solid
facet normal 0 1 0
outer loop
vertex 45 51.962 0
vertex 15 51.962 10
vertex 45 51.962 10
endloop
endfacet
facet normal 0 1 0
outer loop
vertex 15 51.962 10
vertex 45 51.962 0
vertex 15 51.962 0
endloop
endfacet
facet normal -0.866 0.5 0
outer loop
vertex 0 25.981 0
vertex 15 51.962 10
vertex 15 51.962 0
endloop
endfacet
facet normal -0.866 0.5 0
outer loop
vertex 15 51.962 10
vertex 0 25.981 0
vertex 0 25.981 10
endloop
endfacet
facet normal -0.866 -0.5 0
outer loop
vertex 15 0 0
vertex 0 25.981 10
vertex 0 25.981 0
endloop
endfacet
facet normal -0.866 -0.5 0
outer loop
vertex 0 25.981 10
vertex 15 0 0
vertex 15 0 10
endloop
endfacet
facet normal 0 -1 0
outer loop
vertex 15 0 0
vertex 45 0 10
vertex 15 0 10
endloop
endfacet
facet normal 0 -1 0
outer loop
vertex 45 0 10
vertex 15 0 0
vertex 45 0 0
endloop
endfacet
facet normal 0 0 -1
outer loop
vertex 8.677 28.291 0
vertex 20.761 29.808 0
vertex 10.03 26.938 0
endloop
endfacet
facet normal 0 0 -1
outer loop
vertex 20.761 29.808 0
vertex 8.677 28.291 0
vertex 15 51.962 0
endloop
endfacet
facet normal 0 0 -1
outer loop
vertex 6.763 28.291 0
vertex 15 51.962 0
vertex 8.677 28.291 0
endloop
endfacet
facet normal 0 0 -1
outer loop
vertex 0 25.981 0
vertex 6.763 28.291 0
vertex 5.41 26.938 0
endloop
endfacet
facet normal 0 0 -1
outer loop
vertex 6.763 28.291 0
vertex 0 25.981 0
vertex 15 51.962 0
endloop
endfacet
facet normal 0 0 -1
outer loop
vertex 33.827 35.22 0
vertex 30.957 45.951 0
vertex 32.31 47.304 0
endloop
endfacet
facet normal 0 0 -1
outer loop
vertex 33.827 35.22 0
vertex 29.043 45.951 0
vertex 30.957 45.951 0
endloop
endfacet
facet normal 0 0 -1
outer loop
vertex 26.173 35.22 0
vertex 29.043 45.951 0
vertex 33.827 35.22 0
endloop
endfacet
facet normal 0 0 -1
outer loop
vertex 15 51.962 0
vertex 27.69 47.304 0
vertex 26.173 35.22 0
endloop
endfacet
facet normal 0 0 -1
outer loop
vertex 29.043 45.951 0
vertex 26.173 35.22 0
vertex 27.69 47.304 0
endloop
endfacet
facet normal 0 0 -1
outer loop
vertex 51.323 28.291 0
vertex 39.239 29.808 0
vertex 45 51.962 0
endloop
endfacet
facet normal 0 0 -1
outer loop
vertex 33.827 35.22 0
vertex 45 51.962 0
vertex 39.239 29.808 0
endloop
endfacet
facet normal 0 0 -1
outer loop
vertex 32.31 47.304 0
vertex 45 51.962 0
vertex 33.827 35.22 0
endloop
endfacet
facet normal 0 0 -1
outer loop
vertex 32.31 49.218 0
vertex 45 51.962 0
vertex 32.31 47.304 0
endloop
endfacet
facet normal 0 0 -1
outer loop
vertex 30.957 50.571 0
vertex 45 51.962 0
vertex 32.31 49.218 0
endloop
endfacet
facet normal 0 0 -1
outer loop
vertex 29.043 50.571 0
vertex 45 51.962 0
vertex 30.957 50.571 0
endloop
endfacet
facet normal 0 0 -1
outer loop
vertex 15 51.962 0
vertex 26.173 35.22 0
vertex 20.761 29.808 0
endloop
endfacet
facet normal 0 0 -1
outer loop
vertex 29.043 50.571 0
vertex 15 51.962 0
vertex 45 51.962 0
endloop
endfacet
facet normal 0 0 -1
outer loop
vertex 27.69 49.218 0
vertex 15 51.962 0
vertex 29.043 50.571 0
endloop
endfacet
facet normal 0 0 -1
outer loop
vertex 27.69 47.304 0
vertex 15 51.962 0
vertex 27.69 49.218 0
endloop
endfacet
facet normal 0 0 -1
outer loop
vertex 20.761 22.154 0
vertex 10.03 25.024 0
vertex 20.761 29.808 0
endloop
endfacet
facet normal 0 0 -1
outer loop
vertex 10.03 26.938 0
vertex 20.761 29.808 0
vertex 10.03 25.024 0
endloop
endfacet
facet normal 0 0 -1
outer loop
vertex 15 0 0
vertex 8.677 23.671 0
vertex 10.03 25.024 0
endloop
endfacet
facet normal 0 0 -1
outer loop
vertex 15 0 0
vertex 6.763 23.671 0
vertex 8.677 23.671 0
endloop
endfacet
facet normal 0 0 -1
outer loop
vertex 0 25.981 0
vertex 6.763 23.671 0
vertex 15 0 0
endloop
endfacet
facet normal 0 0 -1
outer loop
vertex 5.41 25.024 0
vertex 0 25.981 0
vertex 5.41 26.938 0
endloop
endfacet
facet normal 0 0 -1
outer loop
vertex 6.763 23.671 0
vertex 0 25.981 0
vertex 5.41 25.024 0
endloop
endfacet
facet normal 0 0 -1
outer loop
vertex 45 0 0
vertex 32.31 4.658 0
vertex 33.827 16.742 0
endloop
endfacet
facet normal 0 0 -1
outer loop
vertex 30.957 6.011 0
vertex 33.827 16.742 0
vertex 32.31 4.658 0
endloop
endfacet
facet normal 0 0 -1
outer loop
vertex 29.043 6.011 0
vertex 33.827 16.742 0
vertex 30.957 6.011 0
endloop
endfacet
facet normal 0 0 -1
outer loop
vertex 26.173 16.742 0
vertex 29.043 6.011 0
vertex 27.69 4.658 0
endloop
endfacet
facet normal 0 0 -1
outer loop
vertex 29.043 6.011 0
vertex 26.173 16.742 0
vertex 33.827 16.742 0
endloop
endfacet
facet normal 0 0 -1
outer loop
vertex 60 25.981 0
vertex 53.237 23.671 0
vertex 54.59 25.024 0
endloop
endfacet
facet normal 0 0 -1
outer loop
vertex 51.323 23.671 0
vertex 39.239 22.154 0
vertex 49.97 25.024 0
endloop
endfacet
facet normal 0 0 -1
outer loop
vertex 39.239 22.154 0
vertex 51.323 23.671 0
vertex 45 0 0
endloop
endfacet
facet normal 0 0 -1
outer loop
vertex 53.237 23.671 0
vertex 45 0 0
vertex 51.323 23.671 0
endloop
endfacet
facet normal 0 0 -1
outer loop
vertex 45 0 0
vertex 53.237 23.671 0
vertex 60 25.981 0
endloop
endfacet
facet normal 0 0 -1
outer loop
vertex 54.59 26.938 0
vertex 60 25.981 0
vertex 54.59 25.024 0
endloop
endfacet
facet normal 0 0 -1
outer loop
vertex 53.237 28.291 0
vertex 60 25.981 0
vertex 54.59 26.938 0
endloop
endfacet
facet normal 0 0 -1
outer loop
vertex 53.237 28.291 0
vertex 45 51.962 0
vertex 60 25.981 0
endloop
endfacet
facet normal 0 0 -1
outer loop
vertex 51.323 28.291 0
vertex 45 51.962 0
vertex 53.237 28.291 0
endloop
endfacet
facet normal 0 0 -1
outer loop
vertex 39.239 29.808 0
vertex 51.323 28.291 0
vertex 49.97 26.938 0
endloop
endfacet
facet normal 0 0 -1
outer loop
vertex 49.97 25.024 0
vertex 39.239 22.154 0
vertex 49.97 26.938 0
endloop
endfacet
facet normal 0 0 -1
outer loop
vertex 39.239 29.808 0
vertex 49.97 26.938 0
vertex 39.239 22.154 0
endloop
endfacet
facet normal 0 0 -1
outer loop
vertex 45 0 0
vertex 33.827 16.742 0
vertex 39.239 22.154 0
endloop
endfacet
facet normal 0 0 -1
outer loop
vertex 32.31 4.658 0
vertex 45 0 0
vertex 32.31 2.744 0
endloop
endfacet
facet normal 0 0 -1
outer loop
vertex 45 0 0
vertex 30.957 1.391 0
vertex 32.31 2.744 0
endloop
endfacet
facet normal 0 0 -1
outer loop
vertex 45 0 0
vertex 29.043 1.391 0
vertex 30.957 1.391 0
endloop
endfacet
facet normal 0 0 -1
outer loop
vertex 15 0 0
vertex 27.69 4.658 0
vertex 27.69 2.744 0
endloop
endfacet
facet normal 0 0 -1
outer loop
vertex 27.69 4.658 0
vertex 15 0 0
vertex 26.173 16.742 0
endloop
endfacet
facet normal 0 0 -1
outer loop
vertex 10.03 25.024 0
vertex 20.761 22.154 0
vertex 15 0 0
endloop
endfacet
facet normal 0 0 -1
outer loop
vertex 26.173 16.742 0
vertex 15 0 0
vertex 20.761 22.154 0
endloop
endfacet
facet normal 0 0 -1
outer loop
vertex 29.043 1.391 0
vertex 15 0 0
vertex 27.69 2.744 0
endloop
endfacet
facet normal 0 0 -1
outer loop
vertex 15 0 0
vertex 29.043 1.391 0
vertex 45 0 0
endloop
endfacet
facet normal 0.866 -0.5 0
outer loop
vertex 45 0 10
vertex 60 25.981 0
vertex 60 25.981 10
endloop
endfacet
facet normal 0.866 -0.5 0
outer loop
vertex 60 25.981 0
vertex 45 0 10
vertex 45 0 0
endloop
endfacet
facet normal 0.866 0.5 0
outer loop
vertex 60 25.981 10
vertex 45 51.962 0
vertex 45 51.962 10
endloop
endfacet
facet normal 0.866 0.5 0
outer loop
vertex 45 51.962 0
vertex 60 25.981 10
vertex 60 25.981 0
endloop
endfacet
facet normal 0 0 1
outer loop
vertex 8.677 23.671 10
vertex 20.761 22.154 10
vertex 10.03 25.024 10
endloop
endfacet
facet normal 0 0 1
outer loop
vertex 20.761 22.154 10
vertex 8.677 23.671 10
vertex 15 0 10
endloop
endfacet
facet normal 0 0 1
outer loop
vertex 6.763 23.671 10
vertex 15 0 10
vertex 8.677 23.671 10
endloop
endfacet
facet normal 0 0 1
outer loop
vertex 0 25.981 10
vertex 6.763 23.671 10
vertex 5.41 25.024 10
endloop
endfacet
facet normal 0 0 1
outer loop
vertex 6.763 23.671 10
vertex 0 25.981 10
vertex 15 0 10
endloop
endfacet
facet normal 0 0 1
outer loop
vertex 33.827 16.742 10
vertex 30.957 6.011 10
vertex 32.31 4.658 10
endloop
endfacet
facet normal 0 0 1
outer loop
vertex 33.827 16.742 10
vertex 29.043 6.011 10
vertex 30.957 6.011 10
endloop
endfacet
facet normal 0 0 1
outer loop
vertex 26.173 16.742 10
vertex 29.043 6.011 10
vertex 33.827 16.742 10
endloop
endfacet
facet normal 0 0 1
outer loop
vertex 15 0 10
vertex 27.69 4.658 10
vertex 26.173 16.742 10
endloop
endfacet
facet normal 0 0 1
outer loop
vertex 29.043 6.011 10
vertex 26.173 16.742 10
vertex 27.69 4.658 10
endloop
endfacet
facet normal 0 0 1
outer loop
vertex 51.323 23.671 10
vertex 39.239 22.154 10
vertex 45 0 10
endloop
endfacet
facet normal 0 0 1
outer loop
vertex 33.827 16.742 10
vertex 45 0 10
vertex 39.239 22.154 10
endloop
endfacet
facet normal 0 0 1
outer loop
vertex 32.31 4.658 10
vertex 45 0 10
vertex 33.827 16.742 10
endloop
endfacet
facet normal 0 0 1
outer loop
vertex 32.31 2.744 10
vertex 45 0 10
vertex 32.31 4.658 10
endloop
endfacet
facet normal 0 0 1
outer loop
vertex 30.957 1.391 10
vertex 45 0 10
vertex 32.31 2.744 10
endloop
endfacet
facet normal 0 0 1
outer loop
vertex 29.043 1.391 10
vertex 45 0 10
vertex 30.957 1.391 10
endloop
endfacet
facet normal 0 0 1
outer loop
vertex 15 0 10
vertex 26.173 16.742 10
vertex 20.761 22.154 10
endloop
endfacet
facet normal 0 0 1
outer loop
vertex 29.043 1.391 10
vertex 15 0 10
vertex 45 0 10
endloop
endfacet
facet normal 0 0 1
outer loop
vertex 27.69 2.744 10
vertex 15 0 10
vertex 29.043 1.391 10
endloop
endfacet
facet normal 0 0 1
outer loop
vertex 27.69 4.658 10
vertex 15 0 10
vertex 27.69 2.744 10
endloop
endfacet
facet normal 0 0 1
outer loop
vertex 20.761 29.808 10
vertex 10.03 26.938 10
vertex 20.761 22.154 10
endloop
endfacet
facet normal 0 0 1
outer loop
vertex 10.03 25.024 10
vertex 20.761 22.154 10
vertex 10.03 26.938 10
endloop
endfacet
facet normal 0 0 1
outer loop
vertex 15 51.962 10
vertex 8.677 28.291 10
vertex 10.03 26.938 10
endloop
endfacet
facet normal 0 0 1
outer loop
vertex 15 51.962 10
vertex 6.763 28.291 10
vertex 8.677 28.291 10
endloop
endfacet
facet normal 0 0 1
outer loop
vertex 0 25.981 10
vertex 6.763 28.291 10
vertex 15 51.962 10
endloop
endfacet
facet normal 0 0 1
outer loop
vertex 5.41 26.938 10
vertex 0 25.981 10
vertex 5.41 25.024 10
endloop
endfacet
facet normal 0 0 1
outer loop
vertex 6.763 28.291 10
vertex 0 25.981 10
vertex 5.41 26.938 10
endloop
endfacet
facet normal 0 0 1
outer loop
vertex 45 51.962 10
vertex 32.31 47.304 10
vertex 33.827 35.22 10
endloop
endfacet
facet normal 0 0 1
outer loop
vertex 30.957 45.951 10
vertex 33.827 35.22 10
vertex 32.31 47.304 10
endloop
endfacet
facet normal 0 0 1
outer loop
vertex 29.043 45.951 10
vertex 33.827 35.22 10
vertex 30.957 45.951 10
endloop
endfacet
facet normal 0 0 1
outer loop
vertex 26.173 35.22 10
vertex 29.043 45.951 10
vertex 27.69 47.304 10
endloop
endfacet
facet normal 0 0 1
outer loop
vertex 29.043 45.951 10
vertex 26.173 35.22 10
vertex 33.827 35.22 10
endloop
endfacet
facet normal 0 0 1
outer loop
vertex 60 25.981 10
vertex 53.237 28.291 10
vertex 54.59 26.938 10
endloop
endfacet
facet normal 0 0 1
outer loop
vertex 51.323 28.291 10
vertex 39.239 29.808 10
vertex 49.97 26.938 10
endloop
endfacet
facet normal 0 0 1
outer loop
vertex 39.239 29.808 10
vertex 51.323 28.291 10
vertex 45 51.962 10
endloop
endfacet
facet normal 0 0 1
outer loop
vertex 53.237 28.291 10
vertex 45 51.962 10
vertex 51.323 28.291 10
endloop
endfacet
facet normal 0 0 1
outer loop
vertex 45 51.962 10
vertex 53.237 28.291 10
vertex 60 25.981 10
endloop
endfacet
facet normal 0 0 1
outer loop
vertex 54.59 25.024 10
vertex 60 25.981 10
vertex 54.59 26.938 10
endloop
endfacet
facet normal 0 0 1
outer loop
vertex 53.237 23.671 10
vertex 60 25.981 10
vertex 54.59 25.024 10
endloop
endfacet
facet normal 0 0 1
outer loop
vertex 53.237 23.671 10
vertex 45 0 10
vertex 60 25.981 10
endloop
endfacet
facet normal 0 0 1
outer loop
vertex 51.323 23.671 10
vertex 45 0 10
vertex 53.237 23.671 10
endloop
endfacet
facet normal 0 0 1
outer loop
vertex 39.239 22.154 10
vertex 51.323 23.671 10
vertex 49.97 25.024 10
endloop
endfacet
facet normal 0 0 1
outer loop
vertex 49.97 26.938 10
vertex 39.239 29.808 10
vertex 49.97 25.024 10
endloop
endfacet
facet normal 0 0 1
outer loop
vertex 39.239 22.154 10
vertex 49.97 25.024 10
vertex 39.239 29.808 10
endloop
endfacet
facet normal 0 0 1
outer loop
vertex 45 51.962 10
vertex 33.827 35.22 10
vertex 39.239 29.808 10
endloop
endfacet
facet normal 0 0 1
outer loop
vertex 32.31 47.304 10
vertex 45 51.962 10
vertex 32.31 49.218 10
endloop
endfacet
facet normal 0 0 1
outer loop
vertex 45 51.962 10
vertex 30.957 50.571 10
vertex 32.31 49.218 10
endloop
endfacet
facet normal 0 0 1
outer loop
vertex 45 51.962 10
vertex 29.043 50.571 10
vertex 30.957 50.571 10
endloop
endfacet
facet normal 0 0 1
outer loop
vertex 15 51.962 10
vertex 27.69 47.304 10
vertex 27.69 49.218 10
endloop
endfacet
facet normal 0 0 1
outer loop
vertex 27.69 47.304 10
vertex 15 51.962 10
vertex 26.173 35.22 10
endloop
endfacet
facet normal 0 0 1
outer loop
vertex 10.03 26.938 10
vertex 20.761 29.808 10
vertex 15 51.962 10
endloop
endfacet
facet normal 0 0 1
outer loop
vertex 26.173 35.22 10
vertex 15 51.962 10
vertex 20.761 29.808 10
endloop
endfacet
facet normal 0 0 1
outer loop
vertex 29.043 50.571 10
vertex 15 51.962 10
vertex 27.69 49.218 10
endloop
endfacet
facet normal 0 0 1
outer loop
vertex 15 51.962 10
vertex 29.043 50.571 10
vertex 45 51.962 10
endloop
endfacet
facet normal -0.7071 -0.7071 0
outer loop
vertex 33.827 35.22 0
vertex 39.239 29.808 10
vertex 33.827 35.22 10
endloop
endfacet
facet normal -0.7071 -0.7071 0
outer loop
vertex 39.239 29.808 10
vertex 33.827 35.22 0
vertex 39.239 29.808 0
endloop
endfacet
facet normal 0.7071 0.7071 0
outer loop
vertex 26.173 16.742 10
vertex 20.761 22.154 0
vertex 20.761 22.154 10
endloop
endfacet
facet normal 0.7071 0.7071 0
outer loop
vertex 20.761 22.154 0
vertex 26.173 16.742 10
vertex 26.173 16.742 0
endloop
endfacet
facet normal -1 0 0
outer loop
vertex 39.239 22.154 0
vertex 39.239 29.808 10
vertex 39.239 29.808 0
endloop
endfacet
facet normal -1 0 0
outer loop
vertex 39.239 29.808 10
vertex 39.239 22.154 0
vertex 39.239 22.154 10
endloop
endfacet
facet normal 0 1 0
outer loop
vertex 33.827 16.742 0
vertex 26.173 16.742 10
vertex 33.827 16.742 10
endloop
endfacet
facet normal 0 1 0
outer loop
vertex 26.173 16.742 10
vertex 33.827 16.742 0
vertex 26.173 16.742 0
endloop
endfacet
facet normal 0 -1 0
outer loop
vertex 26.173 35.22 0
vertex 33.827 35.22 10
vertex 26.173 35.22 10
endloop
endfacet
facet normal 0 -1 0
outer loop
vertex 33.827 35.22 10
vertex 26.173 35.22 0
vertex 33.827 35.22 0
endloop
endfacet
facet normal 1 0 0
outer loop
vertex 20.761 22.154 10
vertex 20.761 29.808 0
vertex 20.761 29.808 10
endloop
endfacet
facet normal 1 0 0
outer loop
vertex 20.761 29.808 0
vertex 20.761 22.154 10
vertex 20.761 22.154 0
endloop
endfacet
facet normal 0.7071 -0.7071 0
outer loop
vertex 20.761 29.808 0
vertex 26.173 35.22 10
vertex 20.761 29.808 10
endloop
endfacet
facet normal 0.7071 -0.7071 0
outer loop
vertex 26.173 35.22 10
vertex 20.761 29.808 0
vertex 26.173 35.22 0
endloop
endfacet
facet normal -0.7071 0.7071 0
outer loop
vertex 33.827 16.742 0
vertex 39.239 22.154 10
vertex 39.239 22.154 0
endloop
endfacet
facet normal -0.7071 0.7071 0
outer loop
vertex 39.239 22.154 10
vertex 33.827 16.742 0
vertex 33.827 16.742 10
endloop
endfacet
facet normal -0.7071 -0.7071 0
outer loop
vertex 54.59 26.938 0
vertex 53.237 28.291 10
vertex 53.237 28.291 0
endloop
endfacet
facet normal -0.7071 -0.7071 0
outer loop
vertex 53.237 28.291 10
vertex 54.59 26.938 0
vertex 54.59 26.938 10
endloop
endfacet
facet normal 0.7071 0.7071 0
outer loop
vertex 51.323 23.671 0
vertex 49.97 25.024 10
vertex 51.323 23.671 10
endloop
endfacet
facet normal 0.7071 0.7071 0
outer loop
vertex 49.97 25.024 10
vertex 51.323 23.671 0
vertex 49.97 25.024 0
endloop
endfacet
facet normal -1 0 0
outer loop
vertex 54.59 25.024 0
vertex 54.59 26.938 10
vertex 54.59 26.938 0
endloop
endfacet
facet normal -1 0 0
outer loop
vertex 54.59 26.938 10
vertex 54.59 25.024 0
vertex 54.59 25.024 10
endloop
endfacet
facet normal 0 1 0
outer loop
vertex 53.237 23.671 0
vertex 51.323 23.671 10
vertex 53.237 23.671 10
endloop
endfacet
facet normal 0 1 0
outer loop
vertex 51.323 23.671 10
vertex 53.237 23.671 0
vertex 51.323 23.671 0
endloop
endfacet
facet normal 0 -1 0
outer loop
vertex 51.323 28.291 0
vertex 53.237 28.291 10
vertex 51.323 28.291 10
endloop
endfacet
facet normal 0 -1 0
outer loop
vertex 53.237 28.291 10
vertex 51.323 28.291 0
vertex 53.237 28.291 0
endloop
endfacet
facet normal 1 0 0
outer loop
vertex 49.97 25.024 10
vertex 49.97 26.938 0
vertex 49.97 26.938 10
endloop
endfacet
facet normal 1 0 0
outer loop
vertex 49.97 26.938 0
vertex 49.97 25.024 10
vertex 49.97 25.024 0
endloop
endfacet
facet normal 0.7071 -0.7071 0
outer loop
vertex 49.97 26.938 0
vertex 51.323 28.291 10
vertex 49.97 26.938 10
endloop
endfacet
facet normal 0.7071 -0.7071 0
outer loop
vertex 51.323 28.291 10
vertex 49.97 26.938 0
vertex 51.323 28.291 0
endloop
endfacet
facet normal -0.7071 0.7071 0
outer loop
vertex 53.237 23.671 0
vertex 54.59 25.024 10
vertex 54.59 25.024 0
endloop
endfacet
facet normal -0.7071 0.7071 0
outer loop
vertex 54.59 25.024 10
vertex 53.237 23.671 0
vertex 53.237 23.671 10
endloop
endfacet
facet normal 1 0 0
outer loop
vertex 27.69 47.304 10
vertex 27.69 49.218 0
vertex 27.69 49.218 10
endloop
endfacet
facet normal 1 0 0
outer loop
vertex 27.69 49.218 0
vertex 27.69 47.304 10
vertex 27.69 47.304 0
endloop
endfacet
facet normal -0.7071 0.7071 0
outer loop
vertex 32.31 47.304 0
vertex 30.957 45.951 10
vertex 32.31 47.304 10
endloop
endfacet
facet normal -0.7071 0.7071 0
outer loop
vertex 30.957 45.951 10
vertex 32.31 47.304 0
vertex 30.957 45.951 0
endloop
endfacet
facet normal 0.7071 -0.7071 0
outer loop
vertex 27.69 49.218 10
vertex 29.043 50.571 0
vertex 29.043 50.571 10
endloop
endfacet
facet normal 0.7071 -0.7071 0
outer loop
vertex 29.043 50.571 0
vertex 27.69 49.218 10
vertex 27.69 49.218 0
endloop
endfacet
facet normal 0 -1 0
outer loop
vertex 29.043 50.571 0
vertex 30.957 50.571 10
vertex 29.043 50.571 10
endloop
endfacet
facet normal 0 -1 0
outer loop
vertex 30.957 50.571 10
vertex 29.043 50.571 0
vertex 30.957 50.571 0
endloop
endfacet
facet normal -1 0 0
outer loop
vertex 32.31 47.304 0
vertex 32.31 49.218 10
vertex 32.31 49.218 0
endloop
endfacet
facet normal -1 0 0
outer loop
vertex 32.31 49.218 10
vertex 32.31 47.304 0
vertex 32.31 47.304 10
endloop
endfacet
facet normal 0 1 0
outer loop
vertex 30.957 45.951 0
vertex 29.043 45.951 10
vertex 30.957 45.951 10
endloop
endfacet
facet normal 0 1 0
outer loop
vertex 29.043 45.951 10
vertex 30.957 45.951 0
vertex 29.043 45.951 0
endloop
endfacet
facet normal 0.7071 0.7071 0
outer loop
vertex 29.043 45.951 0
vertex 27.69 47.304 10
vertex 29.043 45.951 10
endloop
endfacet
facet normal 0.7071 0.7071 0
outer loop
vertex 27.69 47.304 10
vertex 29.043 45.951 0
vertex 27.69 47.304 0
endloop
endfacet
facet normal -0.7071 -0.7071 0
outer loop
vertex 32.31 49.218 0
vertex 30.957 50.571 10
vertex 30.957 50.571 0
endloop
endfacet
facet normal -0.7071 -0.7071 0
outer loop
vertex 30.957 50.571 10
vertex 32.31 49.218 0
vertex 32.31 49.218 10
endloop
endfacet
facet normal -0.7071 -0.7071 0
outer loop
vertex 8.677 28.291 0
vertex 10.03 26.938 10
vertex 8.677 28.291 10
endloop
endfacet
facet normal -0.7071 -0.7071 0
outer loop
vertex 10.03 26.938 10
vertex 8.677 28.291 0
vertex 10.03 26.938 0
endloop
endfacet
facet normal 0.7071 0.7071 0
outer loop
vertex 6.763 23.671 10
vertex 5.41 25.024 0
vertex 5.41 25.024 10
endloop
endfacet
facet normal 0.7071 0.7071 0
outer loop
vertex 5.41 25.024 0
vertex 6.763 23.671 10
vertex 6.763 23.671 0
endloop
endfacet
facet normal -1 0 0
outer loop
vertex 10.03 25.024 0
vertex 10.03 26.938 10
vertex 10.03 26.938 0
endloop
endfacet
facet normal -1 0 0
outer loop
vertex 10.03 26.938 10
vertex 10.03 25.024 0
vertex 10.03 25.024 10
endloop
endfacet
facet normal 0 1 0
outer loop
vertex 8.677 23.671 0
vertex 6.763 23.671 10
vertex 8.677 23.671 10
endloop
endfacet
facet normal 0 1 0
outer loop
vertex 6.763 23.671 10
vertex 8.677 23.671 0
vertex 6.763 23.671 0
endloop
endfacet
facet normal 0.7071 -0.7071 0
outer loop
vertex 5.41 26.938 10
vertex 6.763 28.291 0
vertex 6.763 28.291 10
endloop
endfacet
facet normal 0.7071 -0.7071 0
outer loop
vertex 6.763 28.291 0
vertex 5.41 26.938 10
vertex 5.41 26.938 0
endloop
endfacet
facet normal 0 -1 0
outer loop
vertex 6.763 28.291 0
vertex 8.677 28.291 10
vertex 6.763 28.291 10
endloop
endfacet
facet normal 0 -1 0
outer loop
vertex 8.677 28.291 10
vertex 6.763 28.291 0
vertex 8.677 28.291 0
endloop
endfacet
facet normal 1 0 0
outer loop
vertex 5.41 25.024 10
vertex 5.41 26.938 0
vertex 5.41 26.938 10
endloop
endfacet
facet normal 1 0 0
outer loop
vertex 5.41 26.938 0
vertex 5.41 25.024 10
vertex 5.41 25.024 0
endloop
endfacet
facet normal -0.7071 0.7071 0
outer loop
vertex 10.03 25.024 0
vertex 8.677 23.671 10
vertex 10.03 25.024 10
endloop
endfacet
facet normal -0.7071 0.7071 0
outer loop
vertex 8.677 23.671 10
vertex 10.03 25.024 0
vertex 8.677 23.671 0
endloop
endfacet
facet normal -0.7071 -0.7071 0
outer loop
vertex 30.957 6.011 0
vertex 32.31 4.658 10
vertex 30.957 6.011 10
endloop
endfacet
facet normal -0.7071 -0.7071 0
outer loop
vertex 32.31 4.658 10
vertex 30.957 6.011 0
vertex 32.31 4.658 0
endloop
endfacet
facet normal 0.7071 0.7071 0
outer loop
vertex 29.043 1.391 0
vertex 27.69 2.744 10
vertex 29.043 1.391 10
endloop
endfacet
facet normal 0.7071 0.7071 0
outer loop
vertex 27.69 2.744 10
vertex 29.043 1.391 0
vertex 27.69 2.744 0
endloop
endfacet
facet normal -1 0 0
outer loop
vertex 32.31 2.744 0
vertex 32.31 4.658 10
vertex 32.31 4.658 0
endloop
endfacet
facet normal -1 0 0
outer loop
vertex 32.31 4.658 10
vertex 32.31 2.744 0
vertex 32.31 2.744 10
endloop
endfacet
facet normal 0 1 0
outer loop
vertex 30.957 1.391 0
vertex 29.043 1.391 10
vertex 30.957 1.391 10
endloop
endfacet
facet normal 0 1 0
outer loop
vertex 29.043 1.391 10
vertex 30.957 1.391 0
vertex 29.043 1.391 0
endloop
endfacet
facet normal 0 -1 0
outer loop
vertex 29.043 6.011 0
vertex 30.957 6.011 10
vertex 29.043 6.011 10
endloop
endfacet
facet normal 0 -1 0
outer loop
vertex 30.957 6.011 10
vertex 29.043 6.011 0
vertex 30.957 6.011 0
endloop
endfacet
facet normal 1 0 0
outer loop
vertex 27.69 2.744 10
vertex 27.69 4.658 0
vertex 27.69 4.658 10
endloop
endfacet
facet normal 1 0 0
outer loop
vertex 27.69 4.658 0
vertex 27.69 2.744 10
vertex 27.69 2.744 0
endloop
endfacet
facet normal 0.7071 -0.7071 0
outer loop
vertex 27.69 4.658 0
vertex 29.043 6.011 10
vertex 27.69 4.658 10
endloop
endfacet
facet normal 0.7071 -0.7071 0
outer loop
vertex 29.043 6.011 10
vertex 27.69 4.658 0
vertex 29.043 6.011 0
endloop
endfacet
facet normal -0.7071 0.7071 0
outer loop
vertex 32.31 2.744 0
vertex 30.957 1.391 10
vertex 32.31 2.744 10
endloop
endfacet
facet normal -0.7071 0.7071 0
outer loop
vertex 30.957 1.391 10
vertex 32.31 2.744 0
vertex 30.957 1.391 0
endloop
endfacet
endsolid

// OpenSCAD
$fn = 32;

// ----------------------------------------------------------------------
// Polygon plate: 6-gon R30, 4 bolt windows
// ----------------------------------------------------------------------

// --- parameters (mm) ---
sides = 6;                // number of polygon sides
plate_r = 30;             // circumscribed radius of the polygon
bore_r = 10;              // centre bore radius
bolts = 4;                // number of bolt windows
ring_r = 22.28;           // bolt-circle radius
bolt_r = 2.5;             // bolt window radius
plate_t = 10;             // plate thickness, Z (extrusion height)
fit_tol = 0.1;            // declared fit tolerance (prompt contract)
free_tol = 0.3;           // declared free tolerance (prompt contract)

plate_d = 2 * plate_r;  // circumscribed diameter
bore_d = 2 * bore_r;  // centre bore diameter
bolt_d = 2 * bolt_r;  // bolt window diameter
ring_d = 2 * ring_r;  // bolt-circle diameter

profile = [[60, 25.981], [45, 51.962], [15, 51.962], [0, 25.981], [15, 0], [45, 0]];  // primary outline, 6 points, counter clockwise
void_1 = [[39.239, 29.808], [33.827, 35.22], [26.173, 35.22], [20.761, 29.808], [20.761, 22.154], [26.173, 16.742], [33.827, 16.742], [39.239, 22.154]];  // centre bore, 8 points
void_2 = [[54.59, 26.938], [53.237, 28.291], [51.323, 28.291], [49.97, 26.938], [49.97, 25.024], [51.323, 23.671], [53.237, 23.671], [54.59, 25.024]];  // bolt window 1, 8 points
void_3 = [[32.31, 49.218], [30.957, 50.571], [29.043, 50.571], [27.69, 49.218], [27.69, 47.304], [29.043, 45.951], [30.957, 45.951], [32.31, 47.304]];  // bolt window 2, 8 points
void_4 = [[10.03, 26.938], [8.677, 28.291], [6.763, 28.291], [5.41, 26.938], [5.41, 25.024], [6.763, 23.671], [8.677, 23.671], [10.03, 25.024]];  // bolt window 3, 8 points
void_5 = [[32.31, 4.658], [30.957, 6.011], [29.043, 6.011], [27.69, 4.658], [27.69, 2.744], [29.043, 1.391], [30.957, 1.391], [32.31, 2.744]];  // bolt window 4, 8 points

// --- the one profile operation ---
difference() {
  linear_extrude(height = plate_t) polygon(points = profile);
  translate([0, 0, -1])
    linear_extrude(height = plate_t + 2) polygon(points = void_1);
  translate([0, 0, -1])
    linear_extrude(height = plate_t + 2) polygon(points = void_2);
  translate([0, 0, -1])
    linear_extrude(height = plate_t + 2) polygon(points = void_3);
  translate([0, 0, -1])
    linear_extrude(height = plate_t + 2) polygon(points = void_4);
  translate([0, 0, -1])
    linear_extrude(height = plate_t + 2) polygon(points = void_5);
}
